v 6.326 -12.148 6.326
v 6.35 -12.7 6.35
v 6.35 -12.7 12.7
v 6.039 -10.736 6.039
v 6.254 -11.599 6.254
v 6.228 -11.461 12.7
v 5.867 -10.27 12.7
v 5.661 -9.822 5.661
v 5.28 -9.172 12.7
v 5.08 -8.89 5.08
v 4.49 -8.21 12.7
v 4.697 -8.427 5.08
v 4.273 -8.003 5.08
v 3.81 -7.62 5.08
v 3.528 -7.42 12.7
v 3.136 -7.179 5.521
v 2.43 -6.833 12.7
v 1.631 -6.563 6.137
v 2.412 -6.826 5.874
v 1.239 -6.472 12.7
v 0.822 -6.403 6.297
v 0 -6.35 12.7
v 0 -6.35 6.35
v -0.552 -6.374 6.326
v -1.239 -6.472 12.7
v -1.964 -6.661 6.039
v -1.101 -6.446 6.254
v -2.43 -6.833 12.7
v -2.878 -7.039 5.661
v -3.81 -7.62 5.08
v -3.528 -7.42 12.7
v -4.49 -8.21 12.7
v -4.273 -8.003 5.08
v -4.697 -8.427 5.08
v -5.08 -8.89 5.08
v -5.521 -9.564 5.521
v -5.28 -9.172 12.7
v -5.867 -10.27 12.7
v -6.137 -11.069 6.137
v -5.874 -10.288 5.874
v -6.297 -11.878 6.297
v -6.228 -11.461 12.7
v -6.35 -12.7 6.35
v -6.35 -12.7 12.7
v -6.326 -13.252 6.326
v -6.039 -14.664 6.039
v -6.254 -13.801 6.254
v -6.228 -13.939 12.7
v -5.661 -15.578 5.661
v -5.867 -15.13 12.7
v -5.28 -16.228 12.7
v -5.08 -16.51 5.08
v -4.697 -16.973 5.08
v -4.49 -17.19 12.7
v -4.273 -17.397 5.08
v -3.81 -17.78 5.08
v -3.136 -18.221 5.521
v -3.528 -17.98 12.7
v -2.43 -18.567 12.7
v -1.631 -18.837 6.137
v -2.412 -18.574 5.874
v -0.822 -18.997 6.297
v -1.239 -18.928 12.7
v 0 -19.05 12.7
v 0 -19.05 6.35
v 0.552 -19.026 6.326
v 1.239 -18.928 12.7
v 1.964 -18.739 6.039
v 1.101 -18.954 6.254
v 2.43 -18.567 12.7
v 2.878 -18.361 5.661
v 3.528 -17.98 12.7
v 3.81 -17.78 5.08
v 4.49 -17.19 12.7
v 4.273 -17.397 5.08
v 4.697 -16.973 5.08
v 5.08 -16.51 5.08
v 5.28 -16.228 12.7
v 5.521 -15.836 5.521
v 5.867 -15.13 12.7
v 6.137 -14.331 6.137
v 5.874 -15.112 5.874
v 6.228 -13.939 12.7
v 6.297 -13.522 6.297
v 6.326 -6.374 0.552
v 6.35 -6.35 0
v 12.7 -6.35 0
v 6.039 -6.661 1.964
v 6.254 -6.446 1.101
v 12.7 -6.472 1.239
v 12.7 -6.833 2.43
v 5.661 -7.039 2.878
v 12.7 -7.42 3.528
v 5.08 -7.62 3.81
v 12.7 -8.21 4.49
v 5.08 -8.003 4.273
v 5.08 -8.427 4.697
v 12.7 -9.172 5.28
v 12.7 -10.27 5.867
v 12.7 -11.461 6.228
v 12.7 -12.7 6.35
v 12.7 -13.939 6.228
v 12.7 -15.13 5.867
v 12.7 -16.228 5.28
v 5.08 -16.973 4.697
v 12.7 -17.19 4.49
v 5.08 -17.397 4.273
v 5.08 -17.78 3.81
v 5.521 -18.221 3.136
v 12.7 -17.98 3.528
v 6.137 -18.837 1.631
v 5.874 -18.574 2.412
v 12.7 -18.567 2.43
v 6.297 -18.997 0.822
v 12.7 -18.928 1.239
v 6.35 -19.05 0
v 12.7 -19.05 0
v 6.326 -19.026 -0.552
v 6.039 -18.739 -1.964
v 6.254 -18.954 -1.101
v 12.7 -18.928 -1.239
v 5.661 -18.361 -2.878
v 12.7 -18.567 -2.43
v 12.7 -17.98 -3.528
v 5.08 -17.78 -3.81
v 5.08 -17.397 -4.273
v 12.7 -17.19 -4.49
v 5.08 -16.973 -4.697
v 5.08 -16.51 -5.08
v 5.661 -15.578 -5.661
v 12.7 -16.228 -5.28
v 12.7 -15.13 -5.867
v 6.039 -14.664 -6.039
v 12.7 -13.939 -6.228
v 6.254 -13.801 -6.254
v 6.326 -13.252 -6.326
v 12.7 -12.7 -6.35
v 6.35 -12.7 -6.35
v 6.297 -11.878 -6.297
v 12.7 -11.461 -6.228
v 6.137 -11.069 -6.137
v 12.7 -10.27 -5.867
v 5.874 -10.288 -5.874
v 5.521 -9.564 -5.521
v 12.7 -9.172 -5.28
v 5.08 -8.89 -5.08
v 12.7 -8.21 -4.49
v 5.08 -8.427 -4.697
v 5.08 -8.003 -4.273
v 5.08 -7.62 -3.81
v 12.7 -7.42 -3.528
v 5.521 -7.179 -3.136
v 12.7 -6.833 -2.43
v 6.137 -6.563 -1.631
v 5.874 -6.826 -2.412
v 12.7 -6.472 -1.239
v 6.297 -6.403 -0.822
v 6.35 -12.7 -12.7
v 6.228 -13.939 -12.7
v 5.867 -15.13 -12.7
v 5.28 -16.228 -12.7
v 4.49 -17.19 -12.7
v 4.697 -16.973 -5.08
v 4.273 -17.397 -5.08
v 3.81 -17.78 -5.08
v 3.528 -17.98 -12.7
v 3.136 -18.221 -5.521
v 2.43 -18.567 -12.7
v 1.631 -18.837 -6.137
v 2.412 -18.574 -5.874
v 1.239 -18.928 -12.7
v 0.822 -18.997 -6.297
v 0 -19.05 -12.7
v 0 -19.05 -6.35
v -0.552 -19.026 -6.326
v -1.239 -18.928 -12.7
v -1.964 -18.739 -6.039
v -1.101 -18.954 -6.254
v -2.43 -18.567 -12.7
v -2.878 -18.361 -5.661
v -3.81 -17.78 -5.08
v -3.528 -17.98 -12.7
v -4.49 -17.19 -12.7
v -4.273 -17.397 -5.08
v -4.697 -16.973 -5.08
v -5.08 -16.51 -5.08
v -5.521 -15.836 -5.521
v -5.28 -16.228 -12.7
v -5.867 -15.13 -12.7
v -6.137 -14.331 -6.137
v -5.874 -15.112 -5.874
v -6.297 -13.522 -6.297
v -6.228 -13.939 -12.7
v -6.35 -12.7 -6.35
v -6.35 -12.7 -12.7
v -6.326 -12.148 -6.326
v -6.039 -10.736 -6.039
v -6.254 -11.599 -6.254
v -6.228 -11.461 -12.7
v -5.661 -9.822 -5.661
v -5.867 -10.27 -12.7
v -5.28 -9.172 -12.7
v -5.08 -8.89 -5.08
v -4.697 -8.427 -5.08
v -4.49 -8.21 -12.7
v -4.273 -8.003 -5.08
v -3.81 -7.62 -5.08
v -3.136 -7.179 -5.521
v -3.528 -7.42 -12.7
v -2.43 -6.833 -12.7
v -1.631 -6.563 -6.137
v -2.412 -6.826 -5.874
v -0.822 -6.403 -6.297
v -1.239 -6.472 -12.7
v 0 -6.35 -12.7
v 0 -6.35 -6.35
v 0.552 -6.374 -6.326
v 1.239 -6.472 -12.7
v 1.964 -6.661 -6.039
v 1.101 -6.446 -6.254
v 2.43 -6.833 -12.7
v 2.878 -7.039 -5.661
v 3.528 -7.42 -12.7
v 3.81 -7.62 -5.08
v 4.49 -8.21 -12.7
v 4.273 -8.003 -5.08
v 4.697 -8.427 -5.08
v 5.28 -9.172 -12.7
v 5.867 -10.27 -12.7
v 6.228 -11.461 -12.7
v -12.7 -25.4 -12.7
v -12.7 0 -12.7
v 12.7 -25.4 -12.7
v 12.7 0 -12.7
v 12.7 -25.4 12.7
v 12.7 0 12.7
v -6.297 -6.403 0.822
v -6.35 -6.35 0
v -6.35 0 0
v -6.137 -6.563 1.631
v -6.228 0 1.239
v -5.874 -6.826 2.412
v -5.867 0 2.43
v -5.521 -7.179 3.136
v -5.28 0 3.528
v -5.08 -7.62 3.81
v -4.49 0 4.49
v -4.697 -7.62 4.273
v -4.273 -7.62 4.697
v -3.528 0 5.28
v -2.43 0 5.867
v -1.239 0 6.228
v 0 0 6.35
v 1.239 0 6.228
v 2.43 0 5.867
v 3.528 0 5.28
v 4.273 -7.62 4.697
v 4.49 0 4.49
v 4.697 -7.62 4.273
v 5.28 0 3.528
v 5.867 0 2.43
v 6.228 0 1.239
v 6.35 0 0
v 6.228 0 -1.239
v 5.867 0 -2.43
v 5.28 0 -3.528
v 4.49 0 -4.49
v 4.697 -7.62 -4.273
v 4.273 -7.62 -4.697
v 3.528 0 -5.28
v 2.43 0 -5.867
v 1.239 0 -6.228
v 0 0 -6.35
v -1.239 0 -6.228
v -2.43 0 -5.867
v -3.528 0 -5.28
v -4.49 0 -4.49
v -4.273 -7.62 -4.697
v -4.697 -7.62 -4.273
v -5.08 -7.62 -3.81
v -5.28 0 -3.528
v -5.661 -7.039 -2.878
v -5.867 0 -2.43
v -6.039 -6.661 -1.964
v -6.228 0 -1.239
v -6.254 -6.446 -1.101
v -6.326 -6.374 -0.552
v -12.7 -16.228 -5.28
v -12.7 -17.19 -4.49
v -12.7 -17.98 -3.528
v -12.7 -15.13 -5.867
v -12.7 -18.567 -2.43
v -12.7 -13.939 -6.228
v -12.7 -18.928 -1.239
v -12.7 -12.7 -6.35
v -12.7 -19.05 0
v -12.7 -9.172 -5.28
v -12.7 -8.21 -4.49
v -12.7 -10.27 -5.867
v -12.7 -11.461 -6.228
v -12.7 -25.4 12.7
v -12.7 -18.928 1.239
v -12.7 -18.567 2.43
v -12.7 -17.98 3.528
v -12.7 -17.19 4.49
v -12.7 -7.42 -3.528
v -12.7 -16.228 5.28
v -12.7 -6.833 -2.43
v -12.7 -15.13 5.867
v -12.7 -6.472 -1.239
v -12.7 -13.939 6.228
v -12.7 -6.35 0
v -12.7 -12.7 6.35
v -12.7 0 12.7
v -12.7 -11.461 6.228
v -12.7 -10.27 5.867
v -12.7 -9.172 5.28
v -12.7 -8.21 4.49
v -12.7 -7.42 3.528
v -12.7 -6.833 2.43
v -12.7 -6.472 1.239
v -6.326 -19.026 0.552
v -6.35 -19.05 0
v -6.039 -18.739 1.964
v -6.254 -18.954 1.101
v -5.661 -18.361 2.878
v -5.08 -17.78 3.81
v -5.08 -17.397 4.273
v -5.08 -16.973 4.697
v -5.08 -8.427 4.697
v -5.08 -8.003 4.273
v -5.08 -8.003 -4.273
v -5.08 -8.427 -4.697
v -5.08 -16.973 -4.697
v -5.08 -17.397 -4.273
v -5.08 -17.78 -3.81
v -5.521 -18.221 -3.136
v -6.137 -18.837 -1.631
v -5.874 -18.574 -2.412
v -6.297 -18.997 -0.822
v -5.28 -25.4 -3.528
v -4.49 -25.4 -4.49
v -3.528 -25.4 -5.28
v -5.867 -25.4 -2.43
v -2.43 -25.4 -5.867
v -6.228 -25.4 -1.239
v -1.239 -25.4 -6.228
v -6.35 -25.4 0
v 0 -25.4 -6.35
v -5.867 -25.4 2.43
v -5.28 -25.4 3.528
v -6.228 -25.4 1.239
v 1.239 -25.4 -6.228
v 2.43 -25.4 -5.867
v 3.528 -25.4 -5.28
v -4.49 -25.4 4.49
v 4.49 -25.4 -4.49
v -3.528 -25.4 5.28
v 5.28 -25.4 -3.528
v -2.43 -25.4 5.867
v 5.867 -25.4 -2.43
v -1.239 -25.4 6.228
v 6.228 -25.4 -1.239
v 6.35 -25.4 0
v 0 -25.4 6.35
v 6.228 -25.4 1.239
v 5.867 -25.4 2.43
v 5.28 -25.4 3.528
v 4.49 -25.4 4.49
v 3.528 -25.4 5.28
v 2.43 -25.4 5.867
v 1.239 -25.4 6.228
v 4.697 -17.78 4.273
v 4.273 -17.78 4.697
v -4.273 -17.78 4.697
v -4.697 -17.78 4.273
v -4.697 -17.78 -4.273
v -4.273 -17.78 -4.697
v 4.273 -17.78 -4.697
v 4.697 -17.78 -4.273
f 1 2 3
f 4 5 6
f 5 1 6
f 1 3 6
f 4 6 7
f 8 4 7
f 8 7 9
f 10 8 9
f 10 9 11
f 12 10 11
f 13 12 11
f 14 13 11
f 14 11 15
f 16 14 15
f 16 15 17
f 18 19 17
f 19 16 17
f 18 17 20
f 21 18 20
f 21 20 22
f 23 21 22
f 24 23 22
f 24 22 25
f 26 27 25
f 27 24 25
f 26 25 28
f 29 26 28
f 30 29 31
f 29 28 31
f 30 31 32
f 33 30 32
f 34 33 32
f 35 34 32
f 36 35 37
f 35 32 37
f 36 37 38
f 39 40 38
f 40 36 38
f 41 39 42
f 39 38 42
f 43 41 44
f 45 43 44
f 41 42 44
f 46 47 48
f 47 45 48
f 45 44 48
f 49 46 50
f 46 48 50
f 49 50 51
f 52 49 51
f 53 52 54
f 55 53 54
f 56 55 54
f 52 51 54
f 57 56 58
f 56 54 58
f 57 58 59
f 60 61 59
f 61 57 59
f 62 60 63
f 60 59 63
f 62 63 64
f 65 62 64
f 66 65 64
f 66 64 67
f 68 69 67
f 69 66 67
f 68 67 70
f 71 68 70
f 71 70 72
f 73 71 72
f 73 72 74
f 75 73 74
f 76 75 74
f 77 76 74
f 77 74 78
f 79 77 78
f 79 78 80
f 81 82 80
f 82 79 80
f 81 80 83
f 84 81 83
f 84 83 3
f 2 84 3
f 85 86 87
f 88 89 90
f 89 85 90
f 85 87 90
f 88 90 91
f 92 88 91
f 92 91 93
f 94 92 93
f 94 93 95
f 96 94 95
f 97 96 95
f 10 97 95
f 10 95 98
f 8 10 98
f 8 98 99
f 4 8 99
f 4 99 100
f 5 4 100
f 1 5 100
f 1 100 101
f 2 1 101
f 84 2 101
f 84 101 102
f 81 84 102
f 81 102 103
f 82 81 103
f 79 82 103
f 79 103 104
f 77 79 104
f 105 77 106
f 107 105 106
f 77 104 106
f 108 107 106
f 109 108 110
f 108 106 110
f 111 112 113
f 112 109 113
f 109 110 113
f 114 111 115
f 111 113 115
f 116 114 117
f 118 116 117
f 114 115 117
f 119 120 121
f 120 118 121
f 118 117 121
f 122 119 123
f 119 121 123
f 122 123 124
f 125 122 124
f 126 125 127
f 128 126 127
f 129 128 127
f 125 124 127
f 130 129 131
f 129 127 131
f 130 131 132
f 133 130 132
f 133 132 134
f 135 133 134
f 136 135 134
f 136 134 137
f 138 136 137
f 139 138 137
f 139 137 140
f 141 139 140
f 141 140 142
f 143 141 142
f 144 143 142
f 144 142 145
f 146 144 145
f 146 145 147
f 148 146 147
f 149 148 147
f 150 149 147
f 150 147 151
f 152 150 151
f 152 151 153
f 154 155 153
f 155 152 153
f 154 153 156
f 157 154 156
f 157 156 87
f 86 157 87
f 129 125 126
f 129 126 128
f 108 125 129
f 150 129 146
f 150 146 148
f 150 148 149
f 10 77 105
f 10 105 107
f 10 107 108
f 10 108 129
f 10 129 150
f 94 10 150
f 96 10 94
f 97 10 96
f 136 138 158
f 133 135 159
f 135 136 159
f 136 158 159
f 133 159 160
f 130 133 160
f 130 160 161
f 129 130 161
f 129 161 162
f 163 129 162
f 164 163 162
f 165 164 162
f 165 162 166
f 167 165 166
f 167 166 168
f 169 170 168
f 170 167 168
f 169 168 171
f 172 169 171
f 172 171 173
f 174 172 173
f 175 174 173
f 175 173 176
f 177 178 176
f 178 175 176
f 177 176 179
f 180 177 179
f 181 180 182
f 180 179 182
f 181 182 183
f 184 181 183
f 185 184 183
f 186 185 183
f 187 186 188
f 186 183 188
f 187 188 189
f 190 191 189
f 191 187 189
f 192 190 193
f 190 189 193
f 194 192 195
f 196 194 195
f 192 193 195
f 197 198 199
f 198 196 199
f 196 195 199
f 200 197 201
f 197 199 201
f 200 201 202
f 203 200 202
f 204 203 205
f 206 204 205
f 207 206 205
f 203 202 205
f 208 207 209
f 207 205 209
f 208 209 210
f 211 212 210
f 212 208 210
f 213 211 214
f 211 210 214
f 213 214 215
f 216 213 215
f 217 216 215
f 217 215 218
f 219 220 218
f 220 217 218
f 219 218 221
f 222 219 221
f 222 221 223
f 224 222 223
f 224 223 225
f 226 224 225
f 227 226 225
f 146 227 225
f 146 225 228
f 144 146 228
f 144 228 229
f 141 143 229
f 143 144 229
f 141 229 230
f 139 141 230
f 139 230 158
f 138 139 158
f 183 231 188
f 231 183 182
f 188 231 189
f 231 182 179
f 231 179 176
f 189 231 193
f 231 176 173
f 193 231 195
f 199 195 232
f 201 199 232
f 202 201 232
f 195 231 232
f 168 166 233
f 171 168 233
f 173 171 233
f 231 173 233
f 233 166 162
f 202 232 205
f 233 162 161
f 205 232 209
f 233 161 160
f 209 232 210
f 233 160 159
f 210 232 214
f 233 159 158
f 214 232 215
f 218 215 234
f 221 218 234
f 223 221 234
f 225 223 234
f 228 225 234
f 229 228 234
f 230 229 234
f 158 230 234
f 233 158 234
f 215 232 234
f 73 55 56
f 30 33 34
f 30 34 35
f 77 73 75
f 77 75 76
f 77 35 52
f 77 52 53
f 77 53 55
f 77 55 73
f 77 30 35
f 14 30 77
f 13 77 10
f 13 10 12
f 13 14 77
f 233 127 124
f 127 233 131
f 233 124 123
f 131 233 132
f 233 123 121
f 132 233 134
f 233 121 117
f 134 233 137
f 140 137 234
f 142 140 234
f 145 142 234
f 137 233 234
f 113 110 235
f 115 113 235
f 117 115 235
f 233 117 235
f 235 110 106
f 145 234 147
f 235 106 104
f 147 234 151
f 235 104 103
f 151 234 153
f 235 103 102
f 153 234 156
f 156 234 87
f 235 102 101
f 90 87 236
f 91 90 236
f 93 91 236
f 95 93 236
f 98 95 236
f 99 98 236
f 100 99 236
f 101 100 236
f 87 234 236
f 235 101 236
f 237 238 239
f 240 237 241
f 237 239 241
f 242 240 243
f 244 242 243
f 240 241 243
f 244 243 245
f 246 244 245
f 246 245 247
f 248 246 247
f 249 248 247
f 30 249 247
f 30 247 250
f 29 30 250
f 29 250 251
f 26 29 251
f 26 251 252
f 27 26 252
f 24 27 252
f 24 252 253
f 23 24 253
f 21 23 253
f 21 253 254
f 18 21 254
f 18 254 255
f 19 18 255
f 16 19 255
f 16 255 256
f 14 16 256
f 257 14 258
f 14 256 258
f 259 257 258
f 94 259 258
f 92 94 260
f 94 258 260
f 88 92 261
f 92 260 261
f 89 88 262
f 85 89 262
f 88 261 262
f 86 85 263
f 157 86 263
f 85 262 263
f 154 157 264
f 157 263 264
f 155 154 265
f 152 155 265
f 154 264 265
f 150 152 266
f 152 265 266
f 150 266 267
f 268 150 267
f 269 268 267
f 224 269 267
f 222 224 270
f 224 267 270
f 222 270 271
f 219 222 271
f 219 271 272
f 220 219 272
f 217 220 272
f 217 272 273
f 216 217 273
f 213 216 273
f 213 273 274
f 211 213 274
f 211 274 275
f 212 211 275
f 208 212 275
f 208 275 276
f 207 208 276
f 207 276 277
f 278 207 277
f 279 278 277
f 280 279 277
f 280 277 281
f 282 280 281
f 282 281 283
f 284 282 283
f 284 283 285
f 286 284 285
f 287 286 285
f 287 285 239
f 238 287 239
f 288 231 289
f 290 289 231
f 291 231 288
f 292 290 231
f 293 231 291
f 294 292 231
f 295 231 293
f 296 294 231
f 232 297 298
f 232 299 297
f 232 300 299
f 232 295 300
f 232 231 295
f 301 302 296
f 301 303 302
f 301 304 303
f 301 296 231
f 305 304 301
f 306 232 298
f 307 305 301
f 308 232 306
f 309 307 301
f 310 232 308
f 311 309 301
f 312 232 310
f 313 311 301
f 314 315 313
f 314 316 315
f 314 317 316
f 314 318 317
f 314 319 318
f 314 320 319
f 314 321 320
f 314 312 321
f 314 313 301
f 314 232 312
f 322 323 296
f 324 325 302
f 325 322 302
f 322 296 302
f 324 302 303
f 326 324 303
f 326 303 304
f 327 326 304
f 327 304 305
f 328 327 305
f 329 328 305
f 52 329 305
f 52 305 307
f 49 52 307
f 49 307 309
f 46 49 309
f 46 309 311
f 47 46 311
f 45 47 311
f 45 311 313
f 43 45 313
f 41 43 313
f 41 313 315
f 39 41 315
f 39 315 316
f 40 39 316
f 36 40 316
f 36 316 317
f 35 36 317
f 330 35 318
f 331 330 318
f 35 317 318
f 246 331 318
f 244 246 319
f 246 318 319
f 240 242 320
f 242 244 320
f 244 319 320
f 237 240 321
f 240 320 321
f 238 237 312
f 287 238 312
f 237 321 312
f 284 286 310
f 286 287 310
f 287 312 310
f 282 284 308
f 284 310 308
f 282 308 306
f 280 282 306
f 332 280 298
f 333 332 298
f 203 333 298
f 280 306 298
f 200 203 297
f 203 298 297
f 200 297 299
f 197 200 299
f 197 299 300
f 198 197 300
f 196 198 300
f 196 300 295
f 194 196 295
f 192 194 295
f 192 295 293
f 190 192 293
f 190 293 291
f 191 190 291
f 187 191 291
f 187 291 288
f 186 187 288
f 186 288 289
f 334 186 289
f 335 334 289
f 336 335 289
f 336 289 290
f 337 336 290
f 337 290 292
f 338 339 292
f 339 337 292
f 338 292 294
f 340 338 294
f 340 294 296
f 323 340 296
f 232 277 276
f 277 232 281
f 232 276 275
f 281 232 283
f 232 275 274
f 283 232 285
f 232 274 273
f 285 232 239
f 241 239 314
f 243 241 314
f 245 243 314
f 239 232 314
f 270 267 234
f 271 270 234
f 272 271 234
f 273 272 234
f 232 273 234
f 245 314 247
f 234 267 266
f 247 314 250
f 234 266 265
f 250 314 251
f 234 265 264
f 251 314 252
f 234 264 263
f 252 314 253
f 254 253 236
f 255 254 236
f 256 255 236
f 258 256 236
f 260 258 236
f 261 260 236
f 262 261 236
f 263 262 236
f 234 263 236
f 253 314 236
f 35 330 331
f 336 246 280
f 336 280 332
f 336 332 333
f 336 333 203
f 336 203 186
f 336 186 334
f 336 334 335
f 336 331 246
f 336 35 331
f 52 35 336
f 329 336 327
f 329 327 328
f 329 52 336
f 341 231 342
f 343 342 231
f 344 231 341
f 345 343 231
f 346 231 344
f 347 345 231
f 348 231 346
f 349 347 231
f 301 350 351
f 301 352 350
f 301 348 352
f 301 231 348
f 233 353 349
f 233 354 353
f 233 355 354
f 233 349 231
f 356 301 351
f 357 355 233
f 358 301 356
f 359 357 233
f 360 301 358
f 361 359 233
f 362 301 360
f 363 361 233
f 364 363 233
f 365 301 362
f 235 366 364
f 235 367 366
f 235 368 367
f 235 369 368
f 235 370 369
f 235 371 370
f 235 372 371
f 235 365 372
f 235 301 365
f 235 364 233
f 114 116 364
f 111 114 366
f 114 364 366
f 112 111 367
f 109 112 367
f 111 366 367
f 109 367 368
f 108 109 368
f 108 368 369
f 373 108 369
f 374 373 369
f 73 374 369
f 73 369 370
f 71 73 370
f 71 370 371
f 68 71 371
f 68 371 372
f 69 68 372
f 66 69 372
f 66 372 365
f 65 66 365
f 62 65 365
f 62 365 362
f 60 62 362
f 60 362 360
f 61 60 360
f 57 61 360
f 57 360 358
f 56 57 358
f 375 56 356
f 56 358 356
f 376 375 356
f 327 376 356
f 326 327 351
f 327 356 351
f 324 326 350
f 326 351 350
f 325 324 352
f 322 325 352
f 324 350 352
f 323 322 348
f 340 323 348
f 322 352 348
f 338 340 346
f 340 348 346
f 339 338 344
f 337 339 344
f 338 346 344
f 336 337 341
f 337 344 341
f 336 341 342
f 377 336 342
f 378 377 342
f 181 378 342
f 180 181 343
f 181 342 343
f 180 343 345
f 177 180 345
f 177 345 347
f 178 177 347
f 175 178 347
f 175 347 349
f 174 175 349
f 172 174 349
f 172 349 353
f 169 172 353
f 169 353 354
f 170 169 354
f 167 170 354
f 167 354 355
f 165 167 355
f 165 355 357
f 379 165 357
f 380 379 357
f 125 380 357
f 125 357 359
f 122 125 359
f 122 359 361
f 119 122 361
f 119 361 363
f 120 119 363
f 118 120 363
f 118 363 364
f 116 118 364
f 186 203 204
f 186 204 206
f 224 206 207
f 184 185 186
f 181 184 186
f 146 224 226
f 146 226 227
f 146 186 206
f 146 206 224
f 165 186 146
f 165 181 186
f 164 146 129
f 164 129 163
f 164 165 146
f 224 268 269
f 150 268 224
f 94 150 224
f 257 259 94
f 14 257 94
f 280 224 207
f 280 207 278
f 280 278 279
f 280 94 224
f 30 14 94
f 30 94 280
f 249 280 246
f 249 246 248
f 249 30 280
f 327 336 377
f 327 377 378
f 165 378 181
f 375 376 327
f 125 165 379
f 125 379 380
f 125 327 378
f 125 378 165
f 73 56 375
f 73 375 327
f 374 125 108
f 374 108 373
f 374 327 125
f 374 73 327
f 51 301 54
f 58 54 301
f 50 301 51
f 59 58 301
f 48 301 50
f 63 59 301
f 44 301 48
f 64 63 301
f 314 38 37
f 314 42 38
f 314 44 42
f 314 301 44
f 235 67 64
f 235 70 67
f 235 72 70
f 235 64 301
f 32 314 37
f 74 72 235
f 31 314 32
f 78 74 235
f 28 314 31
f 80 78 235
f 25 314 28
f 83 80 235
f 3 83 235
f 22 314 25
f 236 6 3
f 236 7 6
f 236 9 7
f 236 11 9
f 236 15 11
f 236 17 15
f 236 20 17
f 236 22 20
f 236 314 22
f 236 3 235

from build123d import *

# Parameters (mm, degrees)
F0_W      = 25.4
F0_H      = 25.4
F1_DEPTH  = 25.4
F2_R      = 6.35
F3_DEPTH  = 7.62
F4_R      = 6.35
F5_DEPTH  = 7.62
F6_R      = 6.35
F7_DEPTH  = 7.62
F8_R      = 6.35
F9_DEPTH  = 7.62
F10_R     = 6.35
F11_DEPTH = 7.62
F12_R     = 6.35
F13_DEPTH = 7.62


# Not quite as in the source:
# - a feature names something its author has since deleted; it is built from what else it names


with BuildPart() as f1:
    # F0 (on Front) → F1 (new body)
    with BuildSketch(Plane.XZ):
        Rectangle(F0_W, F0_H)
    extrude(amount=F1_DEPTH)

    # F2 (on face) → F3 (cut)
    with BuildSketch(Plane.XZ.offset(25.4)):
        Circle(F2_R)
    extrude(amount=-F3_DEPTH, mode=Mode.SUBTRACT)

    # F4 (on face) → F5 (cut)
    with BuildSketch(Plane(origin=(0, 0, 0), x_dir=(-1, 0, 0), z_dir=(0, 1, 0))):
        Circle(F4_R)
    extrude(amount=-F5_DEPTH, mode=Mode.SUBTRACT)

    # F6 (on face) → F7 (cut)
    with BuildSketch(Plane.YZ.offset(12.7)):
        with Locations((-12.7, 0)):
            Circle(F6_R)
    extrude(amount=-F7_DEPTH, mode=Mode.SUBTRACT)

    # F8 (on face) → F9 (cut)
    with BuildSketch(Plane(origin=(-12.7, 0, 0), x_dir=(0, -1, 0), z_dir=(-1, 0, 0))):
        with Locations((12.7, 0)):
            Circle(F8_R)
    extrude(amount=-F9_DEPTH, mode=Mode.SUBTRACT)

    # F10 (on face) → F11 (cut)
    with BuildSketch(Plane.XY.offset(12.7)):
        with Locations((0, -12.7)):
            Circle(F10_R)
    extrude(amount=-F11_DEPTH, mode=Mode.SUBTRACT)

    # F12 (on face) → F13 (cut)
    with BuildSketch(Plane(origin=(0, 0, -12.7), x_dir=(1, 0, 0), z_dir=(0, 0, -1))):
        with Locations((0, 12.7)):
            Circle(F12_R)
    extrude(amount=-F13_DEPTH, mode=Mode.SUBTRACT)


solid = f1.part
